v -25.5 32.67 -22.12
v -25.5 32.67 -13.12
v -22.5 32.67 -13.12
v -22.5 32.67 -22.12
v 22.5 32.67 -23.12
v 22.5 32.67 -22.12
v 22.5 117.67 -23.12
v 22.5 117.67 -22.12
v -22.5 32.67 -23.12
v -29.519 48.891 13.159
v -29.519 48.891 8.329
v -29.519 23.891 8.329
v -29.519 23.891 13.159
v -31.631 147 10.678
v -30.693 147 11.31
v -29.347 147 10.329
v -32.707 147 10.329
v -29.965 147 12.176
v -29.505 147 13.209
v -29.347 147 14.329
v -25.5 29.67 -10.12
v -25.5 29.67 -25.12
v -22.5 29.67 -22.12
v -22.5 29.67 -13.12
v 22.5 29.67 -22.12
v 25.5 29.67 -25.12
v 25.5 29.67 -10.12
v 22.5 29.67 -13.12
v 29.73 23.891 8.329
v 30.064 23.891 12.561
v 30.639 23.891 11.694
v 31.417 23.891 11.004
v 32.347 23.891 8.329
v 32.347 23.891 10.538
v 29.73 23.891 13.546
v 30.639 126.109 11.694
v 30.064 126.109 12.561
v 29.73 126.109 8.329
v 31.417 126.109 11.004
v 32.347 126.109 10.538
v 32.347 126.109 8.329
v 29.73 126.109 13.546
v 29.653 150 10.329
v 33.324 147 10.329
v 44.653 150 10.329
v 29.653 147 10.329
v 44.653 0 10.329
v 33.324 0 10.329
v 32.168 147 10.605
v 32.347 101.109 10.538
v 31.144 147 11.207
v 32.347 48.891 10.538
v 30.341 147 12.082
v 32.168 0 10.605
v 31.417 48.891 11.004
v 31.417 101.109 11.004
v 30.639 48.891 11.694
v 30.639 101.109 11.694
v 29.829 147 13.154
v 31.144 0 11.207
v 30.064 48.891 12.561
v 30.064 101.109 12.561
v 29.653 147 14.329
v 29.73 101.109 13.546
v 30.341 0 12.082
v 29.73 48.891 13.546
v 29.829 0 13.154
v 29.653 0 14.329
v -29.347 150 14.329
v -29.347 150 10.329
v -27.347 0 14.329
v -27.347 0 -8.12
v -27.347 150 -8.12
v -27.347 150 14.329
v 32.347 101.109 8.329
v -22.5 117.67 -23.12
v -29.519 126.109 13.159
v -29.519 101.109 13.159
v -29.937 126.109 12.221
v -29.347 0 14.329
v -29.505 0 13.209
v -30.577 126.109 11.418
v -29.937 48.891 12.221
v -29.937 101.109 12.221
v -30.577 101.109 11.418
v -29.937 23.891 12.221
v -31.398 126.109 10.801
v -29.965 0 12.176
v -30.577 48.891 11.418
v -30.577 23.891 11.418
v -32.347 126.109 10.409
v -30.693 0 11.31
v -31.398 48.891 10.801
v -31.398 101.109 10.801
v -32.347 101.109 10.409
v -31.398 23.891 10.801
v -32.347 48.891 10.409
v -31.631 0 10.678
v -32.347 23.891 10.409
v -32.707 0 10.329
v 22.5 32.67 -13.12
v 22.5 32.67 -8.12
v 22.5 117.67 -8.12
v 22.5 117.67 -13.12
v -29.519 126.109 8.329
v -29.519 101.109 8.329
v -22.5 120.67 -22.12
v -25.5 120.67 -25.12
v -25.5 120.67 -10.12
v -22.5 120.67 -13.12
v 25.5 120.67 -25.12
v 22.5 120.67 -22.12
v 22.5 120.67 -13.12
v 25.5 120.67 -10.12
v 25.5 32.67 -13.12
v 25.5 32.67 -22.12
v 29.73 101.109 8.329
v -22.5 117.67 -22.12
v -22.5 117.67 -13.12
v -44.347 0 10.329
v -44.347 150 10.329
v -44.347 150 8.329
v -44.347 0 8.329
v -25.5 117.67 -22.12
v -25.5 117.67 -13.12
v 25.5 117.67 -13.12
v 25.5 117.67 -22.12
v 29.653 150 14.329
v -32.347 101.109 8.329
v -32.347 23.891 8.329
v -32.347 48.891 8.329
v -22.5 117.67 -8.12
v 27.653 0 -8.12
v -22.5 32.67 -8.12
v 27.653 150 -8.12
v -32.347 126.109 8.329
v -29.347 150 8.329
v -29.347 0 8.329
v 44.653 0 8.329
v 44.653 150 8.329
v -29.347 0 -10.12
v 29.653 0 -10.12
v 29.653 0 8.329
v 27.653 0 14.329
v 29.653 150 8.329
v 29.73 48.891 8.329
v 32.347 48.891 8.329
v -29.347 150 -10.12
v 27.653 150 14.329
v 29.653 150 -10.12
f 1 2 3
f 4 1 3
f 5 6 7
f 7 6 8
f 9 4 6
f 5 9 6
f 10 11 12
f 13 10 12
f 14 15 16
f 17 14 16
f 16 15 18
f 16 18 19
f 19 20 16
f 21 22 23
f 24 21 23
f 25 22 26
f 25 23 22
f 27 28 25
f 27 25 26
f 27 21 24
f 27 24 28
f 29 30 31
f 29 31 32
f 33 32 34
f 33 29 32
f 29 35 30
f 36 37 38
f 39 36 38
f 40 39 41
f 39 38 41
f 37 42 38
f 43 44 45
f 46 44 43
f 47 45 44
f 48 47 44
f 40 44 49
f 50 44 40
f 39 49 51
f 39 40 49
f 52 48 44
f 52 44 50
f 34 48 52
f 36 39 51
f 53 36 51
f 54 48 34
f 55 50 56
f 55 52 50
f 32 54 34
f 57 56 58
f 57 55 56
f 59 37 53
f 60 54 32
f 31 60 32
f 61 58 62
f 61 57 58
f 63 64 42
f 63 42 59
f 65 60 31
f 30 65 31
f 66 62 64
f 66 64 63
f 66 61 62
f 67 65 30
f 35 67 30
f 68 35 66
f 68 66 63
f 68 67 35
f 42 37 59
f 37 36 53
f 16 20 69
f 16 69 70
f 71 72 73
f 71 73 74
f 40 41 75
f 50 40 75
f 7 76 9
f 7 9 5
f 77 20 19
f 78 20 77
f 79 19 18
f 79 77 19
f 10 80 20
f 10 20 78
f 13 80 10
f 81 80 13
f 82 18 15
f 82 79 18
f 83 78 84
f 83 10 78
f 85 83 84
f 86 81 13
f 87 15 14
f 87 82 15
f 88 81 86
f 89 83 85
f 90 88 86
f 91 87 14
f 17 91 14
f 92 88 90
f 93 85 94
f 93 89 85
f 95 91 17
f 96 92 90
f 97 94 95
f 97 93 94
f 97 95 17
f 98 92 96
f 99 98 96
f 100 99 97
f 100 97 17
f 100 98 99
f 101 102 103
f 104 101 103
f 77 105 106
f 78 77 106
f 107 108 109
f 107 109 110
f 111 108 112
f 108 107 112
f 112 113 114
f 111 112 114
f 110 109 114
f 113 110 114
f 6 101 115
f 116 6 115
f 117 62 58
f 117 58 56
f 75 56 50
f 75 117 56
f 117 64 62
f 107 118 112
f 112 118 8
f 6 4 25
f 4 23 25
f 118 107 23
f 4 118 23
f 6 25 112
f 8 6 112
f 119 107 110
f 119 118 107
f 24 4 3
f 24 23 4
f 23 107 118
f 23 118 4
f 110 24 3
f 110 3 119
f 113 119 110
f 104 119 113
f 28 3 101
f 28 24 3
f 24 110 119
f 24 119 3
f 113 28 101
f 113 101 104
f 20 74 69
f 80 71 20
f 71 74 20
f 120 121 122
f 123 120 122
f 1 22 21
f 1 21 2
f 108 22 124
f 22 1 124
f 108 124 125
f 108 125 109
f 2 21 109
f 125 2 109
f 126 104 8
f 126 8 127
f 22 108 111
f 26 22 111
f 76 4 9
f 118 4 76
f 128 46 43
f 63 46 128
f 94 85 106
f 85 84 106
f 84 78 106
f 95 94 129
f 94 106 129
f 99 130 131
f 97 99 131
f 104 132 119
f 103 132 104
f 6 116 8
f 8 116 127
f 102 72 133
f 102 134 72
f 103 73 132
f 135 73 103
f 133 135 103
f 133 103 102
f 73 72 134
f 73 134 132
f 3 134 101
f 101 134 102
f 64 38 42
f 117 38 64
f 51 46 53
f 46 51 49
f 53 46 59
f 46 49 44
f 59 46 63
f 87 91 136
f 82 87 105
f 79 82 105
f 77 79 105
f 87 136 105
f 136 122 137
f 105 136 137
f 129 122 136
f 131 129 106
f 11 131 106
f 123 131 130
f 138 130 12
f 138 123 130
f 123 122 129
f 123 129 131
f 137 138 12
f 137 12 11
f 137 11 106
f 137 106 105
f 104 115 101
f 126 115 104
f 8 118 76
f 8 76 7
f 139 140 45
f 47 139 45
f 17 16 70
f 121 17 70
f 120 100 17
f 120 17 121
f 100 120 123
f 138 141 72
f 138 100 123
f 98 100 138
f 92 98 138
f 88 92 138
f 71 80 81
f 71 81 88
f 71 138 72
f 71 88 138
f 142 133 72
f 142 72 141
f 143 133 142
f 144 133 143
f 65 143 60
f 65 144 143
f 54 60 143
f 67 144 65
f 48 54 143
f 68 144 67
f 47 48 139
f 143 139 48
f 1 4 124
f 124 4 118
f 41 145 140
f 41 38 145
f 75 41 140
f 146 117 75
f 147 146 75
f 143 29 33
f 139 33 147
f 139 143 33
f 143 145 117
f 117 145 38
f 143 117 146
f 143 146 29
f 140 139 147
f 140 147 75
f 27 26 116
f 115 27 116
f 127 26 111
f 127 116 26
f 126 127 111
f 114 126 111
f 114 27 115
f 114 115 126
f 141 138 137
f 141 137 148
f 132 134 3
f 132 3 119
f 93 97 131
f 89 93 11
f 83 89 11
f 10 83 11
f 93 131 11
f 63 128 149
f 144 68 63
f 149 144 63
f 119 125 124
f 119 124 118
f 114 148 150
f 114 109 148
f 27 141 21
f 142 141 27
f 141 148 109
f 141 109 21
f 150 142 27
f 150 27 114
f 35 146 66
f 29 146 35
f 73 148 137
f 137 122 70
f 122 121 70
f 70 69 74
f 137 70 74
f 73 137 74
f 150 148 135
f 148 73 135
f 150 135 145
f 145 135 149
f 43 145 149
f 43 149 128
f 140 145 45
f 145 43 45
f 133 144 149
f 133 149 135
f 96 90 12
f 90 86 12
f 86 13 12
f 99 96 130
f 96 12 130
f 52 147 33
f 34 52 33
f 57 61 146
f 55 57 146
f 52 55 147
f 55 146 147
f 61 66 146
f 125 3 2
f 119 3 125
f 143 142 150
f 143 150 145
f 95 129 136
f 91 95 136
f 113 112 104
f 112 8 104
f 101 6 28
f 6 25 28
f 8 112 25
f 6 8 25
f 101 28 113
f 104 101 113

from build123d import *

# Parameters (mm, degrees)
F1_DEPTH  = 150
F2_DEPTH  = 147
F3_W      = 51
F3_H      = 91
F3_W_2    = 45
F3_H_2    = 85
F4_DEPTH  = 17
F5_DEPTH  = 15
F6_W      = 85
F6_H      = 9
F7_DEPTH  = 75
F8_W      = 45.0000017881
F8_H      = 9.0000017881
F9_DEPTH  = 95
F10_W     = 2.6170494705
F10_H     = 25
F11_DEPTH = 25


with BuildPart() as f1:
    # F0 (on Front) → F1 (new body)
    with BuildSketch(Plane.XZ):
        Polygon((-44.3471273035, 8.3293294263), (-29.3471273035, 8.3293294263), (-29.3471273035, 10.3293294263), (-30.6854649693, 10.3293294263), (-32.7072627842, 10.3293294263), (-44.3471273035, 10.3293294263), align=None)
        Polygon((-29.3471273035, -10.1195359603), (29.6528726965, -10.1195359603), (29.6528726965, 8.3293294263), (29.6528726965, 10.3293294263), (29.6528726965, 14.3293294263), (27.6528726965, 14.3293294263), (27.6528726965, 10.3293294263), (27.6528726965, 9.2171130797), (27.6528726965, -8.1195359603), (-27.3471273035, -8.1195359603), (-27.3471273035, 9.2171130797), (-27.3471273035, 10.3293294263), (-27.3471273035, 14.3293294263), (-29.3471273035, 14.3293294263), (-29.3471273035, 10.3293294263), (-29.3471273035, 8.3293294263), align=None)
        Polygon((29.6528726965, 10.3293294263), (29.6528726965, 8.3293294263), (44.6528726965, 8.3293294263), (44.6528726965, 10.3293294263), (41.5029401332, 10.3293294263), (33.3236008883, 10.3293294263), align=None)
    extrude(amount=-F1_DEPTH)

    # F0 (on Front) → F2 (join)
    with BuildSketch(Plane.XZ):
        with BuildLine():
            Line((29.6528726965, 14.3293294263), (29.6528726965, 10.3293294263))
            Line((29.6528726965, 10.3293294263), (33.3236008883, 10.3293294263))
            ThreePointArc((33.3236008883, 10.3293294263), (30.709634425, 11.6148200112), (29.6528726965, 14.3293294263))
        make_face()
        with BuildLine():
            Line((-30.6854649693, 10.3293294263), (-29.3471273035, 10.3293294263))
            Line((-29.3471273035, 10.3293294263), (-29.3471273035, 14.3293294263))
            ThreePointArc((-29.3471273035, 14.3293294263), (-30.2986339381, 11.7173134209), (-32.7072627842, 10.3293294263))
            Line((-32.7072627842, 10.3293294263), (-30.6854649693, 10.3293294263))
        make_face()
    extrude(amount=-F2_DEPTH)

    # F3 (on face) → F4 (join)
    with BuildSketch(Plane.XY.offset(-8.1195359603)):
        with Locations((0, 75.1699954271)):
            Rectangle(F3_W, F3_H)
        with Locations((0, 75.1699954271)):
            Rectangle(F3_W_2, F3_H_2, mode=Mode.SUBTRACT)
        with Locations((0, 75.1699954271)):
            Rectangle(F3_W_2, F3_H_2)
    extrude(amount=-F4_DEPTH)

    # F3 (on face) → F5 (cut)
    with BuildSketch(Plane.XY.offset(-8.1195359603)):
        with Locations((0, 75.1699954271)):
            Rectangle(F3_W_2, F3_H_2)
    extrude(amount=-F5_DEPTH, mode=Mode.SUBTRACT)

    # F6 (on face) → F7 (cut)
    with BuildSketch(Plane.YZ.offset(25.5)):
        with Locations((75.1699954271, -17.6195359603)):
            Rectangle(F6_W, F6_H)
    extrude(amount=-F7_DEPTH, mode=Mode.SUBTRACT)

    # F8 (on face) → F9 (cut)
    with BuildSketch(Plane.XZ.offset(-29.6699954271)):
        with Locations((0, -17.6195359603)):
            Rectangle(F8_W, F8_H)
    extrude(amount=-F9_DEPTH, mode=Mode.SUBTRACT)

    # F10 (on face) → F11 (cut)
    with BuildSketch(Plane(origin=(0, 0, 8.3293294263), x_dir=(1, 0, 0), z_dir=(0, 0, -1))):
        Polygon((-29.5194201171, -23.8912090659), (-29.7296848148, -23.8912090659), (-32.3471273035, -23.8912090659), (-32.3471273035, -48.8912090659), (-29.7296848148, -48.8912090659), (-29.5194201171, -48.8912090659), (-29.5194201171, -48.8749593496), align=None)
        with Locations((31.0386025682, -36.3912090659)):
            Rectangle(F10_W, F10_H)
        with Locations((31.0386025682, -113.6087909341)):
            Rectangle(F10_W, F10_H)
        Polygon((-29.5194201171, -101.1250406504), (-29.5194201171, -101.1087909341), (-29.7296848148, -101.1087909341), (-32.3471273035, -101.1087909341), (-32.3471273035, -126.1087909341), (-29.7296848148, -126.1087909341), (-29.5194201171, -126.1087909341), align=None)
    extrude(amount=-F11_DEPTH, mode=Mode.SUBTRACT)


solid = f1.part
